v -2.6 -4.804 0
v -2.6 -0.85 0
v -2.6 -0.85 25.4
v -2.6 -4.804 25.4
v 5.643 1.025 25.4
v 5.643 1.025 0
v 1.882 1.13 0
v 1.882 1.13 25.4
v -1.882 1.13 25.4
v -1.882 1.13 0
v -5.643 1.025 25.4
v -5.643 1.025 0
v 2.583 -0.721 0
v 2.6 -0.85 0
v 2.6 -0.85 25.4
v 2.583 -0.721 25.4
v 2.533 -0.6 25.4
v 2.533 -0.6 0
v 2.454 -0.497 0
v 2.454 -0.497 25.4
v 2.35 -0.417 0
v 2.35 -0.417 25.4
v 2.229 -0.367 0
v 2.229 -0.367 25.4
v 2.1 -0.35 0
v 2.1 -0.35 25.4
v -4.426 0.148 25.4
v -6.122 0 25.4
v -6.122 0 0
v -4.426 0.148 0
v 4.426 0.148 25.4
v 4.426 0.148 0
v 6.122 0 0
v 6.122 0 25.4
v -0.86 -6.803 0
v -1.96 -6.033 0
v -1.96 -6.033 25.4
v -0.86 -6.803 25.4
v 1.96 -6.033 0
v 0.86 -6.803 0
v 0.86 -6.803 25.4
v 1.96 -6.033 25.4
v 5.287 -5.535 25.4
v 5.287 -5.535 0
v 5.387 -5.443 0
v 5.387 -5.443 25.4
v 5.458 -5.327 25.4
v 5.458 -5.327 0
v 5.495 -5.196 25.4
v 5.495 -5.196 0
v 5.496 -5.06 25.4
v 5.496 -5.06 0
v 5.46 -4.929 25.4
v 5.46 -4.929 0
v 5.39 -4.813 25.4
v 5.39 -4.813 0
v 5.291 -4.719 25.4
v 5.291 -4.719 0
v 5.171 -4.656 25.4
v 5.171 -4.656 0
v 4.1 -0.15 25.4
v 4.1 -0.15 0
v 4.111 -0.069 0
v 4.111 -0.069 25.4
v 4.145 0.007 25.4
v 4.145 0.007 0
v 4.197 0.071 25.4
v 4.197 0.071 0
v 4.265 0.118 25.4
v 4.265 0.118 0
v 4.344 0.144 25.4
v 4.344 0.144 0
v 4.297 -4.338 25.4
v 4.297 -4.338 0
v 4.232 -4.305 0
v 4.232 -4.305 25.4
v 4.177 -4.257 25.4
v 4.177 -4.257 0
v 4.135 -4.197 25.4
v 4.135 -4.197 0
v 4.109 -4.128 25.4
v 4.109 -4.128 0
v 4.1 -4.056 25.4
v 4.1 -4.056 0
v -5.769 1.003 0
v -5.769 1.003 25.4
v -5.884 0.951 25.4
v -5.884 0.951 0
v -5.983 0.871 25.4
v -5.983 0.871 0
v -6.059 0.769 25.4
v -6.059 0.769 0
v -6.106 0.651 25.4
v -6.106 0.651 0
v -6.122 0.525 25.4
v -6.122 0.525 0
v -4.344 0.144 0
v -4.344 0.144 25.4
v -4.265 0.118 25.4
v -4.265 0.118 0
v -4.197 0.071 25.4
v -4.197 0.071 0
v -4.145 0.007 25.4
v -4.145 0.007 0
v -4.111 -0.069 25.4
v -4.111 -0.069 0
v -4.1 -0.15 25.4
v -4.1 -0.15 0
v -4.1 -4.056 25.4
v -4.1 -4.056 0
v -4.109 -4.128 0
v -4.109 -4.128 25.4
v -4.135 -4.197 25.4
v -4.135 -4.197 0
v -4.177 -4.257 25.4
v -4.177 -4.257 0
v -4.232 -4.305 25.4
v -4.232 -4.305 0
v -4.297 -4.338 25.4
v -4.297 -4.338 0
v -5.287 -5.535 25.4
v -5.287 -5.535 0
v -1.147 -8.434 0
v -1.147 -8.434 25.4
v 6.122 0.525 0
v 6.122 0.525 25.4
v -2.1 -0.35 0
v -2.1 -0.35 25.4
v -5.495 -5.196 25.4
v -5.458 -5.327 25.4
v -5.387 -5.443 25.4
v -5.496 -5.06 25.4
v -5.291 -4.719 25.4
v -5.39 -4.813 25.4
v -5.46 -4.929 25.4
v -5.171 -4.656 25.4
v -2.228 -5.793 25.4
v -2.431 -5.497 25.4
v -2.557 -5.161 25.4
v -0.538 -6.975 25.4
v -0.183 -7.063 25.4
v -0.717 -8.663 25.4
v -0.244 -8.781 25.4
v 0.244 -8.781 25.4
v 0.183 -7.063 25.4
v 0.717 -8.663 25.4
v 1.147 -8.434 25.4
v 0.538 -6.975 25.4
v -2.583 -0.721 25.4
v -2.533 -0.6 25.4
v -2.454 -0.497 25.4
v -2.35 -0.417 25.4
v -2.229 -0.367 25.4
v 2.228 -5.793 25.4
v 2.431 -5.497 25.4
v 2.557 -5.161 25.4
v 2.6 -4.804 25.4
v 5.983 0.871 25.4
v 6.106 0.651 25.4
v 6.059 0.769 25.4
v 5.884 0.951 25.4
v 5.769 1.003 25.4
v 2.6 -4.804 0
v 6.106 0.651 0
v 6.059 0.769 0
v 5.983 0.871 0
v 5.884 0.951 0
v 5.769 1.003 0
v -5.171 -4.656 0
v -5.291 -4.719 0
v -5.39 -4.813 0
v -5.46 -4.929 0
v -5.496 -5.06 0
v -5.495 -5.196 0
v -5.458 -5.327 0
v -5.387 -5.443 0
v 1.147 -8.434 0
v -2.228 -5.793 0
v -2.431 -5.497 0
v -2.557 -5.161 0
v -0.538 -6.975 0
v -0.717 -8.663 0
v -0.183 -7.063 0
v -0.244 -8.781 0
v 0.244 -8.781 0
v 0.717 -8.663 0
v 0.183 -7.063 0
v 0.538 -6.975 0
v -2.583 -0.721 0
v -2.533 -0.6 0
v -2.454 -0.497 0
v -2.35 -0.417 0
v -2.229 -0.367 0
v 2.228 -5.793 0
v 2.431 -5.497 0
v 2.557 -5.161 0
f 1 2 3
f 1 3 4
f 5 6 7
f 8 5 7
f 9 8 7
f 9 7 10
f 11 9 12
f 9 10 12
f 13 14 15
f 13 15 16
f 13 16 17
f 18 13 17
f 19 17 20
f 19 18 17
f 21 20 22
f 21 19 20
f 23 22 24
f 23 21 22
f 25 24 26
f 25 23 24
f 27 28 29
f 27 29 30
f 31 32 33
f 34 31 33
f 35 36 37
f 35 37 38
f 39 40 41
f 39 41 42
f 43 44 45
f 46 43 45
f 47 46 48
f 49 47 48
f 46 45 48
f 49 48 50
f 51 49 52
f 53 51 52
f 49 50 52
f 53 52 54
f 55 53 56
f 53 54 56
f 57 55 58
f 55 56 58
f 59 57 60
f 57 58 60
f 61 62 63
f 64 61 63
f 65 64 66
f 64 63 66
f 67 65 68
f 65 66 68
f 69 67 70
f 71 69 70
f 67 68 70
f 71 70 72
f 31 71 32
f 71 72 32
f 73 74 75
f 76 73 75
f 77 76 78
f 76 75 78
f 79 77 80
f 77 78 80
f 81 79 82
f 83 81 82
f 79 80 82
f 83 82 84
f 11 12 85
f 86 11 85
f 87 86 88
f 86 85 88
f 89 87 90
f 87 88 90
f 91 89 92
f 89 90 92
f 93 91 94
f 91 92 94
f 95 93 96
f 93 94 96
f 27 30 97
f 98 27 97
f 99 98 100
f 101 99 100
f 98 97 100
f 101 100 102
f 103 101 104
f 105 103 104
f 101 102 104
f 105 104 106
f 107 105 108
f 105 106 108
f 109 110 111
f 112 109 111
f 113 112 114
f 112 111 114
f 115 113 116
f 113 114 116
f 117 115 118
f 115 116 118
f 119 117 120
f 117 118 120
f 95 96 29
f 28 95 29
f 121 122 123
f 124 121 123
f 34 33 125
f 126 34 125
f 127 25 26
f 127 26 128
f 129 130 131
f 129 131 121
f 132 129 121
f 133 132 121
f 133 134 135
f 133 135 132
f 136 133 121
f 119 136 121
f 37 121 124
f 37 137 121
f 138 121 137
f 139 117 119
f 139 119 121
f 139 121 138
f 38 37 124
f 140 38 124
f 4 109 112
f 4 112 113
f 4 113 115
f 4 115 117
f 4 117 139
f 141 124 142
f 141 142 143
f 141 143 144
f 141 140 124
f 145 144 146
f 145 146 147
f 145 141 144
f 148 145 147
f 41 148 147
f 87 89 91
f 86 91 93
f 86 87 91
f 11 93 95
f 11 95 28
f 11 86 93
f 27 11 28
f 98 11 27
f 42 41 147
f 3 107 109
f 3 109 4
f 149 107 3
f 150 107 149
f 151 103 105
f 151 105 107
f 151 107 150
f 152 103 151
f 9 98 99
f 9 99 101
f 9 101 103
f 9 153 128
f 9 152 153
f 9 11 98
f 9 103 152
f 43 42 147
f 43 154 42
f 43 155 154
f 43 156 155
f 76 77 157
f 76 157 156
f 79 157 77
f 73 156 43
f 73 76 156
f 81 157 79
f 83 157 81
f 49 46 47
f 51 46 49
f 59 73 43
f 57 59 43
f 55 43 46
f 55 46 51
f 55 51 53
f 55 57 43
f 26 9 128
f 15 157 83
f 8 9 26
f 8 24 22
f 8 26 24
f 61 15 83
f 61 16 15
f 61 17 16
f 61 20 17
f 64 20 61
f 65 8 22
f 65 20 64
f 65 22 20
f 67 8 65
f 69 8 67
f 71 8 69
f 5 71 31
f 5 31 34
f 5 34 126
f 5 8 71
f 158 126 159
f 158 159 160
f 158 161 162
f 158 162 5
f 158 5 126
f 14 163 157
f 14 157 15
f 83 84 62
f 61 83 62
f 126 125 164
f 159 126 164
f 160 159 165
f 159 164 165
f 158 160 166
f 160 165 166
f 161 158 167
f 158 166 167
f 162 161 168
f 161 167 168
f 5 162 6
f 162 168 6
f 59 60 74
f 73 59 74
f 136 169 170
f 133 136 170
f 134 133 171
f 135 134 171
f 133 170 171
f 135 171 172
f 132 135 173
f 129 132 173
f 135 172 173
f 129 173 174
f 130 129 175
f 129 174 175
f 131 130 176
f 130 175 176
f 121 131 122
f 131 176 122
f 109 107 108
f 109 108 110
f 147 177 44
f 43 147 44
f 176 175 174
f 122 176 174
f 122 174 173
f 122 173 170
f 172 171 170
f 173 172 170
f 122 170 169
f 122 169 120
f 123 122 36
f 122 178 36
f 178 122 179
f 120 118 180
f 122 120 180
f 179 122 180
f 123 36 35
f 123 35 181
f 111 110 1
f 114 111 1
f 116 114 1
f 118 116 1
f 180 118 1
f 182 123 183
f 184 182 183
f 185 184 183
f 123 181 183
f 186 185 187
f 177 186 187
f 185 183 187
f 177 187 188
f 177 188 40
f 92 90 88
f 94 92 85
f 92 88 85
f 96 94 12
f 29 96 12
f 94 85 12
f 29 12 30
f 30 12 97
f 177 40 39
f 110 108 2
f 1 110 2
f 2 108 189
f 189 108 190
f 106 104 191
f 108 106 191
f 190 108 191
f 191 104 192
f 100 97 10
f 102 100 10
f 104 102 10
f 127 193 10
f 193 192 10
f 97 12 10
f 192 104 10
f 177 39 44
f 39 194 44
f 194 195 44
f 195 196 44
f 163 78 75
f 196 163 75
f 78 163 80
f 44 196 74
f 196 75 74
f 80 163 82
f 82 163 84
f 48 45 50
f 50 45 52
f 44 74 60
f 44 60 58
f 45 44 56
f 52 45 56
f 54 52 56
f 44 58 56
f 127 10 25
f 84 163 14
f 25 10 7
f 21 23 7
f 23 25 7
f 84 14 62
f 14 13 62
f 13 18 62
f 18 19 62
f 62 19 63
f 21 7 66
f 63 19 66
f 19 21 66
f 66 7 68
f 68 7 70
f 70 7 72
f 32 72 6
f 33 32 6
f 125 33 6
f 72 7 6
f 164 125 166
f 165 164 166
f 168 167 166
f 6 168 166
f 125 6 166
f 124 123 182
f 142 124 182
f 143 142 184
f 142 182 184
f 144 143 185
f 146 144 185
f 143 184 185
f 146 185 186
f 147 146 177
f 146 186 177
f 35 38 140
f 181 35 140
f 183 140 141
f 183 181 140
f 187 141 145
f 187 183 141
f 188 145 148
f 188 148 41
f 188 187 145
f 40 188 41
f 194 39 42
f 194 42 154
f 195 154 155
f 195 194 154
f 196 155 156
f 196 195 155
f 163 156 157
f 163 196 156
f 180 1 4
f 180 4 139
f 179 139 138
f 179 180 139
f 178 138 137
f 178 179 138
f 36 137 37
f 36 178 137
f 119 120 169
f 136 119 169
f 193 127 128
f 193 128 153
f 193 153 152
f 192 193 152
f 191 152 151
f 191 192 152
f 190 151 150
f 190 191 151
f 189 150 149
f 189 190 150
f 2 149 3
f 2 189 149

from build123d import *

# Parameters (mm, degrees)
EXTRUSION4_DEPTH = 25.4


with BuildPart() as part:
    # Sketch1 → Extrusion4 (new body)
    with BuildSketch(Plane.XY):
        with BuildLine():
            ThreePointArc((5.643340731, 1.02471553), (5e-09, 1.14270907), (-5.643340721, 1.02471553))
            ThreePointArc((-5.643340721, 1.02471553), (-5.983308169, 0.871238001), (-6.12244139, 0.525152514))
            Line((-6.12244139, 0.525152514), (-6.12244139, 0))
            Line((-6.12244139, 0), (-4.426152829, 0.148406019))
            ThreePointArc((-4.426152829, 0.148406019), (-4.197329039, 0.070730809), (-4.1000061, -0.150452395))
            Line((-4.1000061, -0.150452395), (-4.1000061, -4.055821252))
            ThreePointArc((-4.1000061, -4.055821252), (-4.154260478, -4.227894187), (-4.297400051, -4.337729045))
            Line((-4.297400051, -4.337729045), (-5.171010065, -4.655697092))
            ThreePointArc((-5.171010065, -4.655697092), (-5.495722421, -5.060280306), (-5.286788207, -5.535119422))
            Line((-5.286788207, -5.535119422), (-1.147152857, -8.433723282))
            ThreePointArc((-1.147152857, -8.433723282), (1e-08, -8.79541919), (1.147152877, -8.433723282))
            Line((1.147152877, -8.433723282), (5.286788227, -5.535119422))
            ThreePointArc((5.286788227, -5.535119422), (5.495722441, -5.060280306), (5.171010085, -4.655697092))
            Line((5.171010085, -4.655697092), (4.297400071, -4.337729045))
            ThreePointArc((4.297400071, -4.337729045), (4.154260498, -4.227894187), (4.10000611, -4.055821252))
            Line((4.10000611, -4.055821252), (4.10000611, -0.15045238))
            ThreePointArc((4.10000611, -0.15045238), (4.197329045, 0.070730814), (4.426152823, 0.148406021))
            Line((4.426152823, 0.148406021), (6.1224414, 0))
            Line((6.1224414, 0), (6.1224414, 0.525152514))
            ThreePointArc((6.1224414, 0.525152514), (5.983308179, 0.871238001), (5.643340731, 1.02471553))
        make_face()
        with BuildLine():
            ThreePointArc((-2.100006108, -0.35045215), (-2.4535595, -0.49689876), (-2.60000611, -0.850452152))
            Line((-2.60000611, -0.850452152), (-2.60000611, -4.804412051))
            ThreePointArc((-2.60000611, -4.804412051), (-2.430522356, -5.497034977), (-1.960370752, -6.033140126))
            Line((-1.960370752, -6.033140126), (-0.860364633, -6.803372685))
            ThreePointArc((-0.860364633, -6.803372685), (2e-08, -7.07464461), (0.860364668, -6.803372674))
            Line((0.860364668, -6.803372674), (1.960370758, -6.033140115))
            ThreePointArc((1.960370758, -6.033140115), (2.430522351, -5.497034969), (2.6000061, -4.804412051))
            Line((2.6000061, -4.804412051), (2.6000061, -0.850452152))
            ThreePointArc((2.6000061, -0.850452152), (2.45355949, -0.49689876), (2.100006098, -0.35045215))
            Line((2.100006098, -0.35045215), (-2.100006108, -0.35045215))
        make_face(mode=Mode.SUBTRACT)
    extrude(amount=EXTRUSION4_DEPTH)


solid = part.part
